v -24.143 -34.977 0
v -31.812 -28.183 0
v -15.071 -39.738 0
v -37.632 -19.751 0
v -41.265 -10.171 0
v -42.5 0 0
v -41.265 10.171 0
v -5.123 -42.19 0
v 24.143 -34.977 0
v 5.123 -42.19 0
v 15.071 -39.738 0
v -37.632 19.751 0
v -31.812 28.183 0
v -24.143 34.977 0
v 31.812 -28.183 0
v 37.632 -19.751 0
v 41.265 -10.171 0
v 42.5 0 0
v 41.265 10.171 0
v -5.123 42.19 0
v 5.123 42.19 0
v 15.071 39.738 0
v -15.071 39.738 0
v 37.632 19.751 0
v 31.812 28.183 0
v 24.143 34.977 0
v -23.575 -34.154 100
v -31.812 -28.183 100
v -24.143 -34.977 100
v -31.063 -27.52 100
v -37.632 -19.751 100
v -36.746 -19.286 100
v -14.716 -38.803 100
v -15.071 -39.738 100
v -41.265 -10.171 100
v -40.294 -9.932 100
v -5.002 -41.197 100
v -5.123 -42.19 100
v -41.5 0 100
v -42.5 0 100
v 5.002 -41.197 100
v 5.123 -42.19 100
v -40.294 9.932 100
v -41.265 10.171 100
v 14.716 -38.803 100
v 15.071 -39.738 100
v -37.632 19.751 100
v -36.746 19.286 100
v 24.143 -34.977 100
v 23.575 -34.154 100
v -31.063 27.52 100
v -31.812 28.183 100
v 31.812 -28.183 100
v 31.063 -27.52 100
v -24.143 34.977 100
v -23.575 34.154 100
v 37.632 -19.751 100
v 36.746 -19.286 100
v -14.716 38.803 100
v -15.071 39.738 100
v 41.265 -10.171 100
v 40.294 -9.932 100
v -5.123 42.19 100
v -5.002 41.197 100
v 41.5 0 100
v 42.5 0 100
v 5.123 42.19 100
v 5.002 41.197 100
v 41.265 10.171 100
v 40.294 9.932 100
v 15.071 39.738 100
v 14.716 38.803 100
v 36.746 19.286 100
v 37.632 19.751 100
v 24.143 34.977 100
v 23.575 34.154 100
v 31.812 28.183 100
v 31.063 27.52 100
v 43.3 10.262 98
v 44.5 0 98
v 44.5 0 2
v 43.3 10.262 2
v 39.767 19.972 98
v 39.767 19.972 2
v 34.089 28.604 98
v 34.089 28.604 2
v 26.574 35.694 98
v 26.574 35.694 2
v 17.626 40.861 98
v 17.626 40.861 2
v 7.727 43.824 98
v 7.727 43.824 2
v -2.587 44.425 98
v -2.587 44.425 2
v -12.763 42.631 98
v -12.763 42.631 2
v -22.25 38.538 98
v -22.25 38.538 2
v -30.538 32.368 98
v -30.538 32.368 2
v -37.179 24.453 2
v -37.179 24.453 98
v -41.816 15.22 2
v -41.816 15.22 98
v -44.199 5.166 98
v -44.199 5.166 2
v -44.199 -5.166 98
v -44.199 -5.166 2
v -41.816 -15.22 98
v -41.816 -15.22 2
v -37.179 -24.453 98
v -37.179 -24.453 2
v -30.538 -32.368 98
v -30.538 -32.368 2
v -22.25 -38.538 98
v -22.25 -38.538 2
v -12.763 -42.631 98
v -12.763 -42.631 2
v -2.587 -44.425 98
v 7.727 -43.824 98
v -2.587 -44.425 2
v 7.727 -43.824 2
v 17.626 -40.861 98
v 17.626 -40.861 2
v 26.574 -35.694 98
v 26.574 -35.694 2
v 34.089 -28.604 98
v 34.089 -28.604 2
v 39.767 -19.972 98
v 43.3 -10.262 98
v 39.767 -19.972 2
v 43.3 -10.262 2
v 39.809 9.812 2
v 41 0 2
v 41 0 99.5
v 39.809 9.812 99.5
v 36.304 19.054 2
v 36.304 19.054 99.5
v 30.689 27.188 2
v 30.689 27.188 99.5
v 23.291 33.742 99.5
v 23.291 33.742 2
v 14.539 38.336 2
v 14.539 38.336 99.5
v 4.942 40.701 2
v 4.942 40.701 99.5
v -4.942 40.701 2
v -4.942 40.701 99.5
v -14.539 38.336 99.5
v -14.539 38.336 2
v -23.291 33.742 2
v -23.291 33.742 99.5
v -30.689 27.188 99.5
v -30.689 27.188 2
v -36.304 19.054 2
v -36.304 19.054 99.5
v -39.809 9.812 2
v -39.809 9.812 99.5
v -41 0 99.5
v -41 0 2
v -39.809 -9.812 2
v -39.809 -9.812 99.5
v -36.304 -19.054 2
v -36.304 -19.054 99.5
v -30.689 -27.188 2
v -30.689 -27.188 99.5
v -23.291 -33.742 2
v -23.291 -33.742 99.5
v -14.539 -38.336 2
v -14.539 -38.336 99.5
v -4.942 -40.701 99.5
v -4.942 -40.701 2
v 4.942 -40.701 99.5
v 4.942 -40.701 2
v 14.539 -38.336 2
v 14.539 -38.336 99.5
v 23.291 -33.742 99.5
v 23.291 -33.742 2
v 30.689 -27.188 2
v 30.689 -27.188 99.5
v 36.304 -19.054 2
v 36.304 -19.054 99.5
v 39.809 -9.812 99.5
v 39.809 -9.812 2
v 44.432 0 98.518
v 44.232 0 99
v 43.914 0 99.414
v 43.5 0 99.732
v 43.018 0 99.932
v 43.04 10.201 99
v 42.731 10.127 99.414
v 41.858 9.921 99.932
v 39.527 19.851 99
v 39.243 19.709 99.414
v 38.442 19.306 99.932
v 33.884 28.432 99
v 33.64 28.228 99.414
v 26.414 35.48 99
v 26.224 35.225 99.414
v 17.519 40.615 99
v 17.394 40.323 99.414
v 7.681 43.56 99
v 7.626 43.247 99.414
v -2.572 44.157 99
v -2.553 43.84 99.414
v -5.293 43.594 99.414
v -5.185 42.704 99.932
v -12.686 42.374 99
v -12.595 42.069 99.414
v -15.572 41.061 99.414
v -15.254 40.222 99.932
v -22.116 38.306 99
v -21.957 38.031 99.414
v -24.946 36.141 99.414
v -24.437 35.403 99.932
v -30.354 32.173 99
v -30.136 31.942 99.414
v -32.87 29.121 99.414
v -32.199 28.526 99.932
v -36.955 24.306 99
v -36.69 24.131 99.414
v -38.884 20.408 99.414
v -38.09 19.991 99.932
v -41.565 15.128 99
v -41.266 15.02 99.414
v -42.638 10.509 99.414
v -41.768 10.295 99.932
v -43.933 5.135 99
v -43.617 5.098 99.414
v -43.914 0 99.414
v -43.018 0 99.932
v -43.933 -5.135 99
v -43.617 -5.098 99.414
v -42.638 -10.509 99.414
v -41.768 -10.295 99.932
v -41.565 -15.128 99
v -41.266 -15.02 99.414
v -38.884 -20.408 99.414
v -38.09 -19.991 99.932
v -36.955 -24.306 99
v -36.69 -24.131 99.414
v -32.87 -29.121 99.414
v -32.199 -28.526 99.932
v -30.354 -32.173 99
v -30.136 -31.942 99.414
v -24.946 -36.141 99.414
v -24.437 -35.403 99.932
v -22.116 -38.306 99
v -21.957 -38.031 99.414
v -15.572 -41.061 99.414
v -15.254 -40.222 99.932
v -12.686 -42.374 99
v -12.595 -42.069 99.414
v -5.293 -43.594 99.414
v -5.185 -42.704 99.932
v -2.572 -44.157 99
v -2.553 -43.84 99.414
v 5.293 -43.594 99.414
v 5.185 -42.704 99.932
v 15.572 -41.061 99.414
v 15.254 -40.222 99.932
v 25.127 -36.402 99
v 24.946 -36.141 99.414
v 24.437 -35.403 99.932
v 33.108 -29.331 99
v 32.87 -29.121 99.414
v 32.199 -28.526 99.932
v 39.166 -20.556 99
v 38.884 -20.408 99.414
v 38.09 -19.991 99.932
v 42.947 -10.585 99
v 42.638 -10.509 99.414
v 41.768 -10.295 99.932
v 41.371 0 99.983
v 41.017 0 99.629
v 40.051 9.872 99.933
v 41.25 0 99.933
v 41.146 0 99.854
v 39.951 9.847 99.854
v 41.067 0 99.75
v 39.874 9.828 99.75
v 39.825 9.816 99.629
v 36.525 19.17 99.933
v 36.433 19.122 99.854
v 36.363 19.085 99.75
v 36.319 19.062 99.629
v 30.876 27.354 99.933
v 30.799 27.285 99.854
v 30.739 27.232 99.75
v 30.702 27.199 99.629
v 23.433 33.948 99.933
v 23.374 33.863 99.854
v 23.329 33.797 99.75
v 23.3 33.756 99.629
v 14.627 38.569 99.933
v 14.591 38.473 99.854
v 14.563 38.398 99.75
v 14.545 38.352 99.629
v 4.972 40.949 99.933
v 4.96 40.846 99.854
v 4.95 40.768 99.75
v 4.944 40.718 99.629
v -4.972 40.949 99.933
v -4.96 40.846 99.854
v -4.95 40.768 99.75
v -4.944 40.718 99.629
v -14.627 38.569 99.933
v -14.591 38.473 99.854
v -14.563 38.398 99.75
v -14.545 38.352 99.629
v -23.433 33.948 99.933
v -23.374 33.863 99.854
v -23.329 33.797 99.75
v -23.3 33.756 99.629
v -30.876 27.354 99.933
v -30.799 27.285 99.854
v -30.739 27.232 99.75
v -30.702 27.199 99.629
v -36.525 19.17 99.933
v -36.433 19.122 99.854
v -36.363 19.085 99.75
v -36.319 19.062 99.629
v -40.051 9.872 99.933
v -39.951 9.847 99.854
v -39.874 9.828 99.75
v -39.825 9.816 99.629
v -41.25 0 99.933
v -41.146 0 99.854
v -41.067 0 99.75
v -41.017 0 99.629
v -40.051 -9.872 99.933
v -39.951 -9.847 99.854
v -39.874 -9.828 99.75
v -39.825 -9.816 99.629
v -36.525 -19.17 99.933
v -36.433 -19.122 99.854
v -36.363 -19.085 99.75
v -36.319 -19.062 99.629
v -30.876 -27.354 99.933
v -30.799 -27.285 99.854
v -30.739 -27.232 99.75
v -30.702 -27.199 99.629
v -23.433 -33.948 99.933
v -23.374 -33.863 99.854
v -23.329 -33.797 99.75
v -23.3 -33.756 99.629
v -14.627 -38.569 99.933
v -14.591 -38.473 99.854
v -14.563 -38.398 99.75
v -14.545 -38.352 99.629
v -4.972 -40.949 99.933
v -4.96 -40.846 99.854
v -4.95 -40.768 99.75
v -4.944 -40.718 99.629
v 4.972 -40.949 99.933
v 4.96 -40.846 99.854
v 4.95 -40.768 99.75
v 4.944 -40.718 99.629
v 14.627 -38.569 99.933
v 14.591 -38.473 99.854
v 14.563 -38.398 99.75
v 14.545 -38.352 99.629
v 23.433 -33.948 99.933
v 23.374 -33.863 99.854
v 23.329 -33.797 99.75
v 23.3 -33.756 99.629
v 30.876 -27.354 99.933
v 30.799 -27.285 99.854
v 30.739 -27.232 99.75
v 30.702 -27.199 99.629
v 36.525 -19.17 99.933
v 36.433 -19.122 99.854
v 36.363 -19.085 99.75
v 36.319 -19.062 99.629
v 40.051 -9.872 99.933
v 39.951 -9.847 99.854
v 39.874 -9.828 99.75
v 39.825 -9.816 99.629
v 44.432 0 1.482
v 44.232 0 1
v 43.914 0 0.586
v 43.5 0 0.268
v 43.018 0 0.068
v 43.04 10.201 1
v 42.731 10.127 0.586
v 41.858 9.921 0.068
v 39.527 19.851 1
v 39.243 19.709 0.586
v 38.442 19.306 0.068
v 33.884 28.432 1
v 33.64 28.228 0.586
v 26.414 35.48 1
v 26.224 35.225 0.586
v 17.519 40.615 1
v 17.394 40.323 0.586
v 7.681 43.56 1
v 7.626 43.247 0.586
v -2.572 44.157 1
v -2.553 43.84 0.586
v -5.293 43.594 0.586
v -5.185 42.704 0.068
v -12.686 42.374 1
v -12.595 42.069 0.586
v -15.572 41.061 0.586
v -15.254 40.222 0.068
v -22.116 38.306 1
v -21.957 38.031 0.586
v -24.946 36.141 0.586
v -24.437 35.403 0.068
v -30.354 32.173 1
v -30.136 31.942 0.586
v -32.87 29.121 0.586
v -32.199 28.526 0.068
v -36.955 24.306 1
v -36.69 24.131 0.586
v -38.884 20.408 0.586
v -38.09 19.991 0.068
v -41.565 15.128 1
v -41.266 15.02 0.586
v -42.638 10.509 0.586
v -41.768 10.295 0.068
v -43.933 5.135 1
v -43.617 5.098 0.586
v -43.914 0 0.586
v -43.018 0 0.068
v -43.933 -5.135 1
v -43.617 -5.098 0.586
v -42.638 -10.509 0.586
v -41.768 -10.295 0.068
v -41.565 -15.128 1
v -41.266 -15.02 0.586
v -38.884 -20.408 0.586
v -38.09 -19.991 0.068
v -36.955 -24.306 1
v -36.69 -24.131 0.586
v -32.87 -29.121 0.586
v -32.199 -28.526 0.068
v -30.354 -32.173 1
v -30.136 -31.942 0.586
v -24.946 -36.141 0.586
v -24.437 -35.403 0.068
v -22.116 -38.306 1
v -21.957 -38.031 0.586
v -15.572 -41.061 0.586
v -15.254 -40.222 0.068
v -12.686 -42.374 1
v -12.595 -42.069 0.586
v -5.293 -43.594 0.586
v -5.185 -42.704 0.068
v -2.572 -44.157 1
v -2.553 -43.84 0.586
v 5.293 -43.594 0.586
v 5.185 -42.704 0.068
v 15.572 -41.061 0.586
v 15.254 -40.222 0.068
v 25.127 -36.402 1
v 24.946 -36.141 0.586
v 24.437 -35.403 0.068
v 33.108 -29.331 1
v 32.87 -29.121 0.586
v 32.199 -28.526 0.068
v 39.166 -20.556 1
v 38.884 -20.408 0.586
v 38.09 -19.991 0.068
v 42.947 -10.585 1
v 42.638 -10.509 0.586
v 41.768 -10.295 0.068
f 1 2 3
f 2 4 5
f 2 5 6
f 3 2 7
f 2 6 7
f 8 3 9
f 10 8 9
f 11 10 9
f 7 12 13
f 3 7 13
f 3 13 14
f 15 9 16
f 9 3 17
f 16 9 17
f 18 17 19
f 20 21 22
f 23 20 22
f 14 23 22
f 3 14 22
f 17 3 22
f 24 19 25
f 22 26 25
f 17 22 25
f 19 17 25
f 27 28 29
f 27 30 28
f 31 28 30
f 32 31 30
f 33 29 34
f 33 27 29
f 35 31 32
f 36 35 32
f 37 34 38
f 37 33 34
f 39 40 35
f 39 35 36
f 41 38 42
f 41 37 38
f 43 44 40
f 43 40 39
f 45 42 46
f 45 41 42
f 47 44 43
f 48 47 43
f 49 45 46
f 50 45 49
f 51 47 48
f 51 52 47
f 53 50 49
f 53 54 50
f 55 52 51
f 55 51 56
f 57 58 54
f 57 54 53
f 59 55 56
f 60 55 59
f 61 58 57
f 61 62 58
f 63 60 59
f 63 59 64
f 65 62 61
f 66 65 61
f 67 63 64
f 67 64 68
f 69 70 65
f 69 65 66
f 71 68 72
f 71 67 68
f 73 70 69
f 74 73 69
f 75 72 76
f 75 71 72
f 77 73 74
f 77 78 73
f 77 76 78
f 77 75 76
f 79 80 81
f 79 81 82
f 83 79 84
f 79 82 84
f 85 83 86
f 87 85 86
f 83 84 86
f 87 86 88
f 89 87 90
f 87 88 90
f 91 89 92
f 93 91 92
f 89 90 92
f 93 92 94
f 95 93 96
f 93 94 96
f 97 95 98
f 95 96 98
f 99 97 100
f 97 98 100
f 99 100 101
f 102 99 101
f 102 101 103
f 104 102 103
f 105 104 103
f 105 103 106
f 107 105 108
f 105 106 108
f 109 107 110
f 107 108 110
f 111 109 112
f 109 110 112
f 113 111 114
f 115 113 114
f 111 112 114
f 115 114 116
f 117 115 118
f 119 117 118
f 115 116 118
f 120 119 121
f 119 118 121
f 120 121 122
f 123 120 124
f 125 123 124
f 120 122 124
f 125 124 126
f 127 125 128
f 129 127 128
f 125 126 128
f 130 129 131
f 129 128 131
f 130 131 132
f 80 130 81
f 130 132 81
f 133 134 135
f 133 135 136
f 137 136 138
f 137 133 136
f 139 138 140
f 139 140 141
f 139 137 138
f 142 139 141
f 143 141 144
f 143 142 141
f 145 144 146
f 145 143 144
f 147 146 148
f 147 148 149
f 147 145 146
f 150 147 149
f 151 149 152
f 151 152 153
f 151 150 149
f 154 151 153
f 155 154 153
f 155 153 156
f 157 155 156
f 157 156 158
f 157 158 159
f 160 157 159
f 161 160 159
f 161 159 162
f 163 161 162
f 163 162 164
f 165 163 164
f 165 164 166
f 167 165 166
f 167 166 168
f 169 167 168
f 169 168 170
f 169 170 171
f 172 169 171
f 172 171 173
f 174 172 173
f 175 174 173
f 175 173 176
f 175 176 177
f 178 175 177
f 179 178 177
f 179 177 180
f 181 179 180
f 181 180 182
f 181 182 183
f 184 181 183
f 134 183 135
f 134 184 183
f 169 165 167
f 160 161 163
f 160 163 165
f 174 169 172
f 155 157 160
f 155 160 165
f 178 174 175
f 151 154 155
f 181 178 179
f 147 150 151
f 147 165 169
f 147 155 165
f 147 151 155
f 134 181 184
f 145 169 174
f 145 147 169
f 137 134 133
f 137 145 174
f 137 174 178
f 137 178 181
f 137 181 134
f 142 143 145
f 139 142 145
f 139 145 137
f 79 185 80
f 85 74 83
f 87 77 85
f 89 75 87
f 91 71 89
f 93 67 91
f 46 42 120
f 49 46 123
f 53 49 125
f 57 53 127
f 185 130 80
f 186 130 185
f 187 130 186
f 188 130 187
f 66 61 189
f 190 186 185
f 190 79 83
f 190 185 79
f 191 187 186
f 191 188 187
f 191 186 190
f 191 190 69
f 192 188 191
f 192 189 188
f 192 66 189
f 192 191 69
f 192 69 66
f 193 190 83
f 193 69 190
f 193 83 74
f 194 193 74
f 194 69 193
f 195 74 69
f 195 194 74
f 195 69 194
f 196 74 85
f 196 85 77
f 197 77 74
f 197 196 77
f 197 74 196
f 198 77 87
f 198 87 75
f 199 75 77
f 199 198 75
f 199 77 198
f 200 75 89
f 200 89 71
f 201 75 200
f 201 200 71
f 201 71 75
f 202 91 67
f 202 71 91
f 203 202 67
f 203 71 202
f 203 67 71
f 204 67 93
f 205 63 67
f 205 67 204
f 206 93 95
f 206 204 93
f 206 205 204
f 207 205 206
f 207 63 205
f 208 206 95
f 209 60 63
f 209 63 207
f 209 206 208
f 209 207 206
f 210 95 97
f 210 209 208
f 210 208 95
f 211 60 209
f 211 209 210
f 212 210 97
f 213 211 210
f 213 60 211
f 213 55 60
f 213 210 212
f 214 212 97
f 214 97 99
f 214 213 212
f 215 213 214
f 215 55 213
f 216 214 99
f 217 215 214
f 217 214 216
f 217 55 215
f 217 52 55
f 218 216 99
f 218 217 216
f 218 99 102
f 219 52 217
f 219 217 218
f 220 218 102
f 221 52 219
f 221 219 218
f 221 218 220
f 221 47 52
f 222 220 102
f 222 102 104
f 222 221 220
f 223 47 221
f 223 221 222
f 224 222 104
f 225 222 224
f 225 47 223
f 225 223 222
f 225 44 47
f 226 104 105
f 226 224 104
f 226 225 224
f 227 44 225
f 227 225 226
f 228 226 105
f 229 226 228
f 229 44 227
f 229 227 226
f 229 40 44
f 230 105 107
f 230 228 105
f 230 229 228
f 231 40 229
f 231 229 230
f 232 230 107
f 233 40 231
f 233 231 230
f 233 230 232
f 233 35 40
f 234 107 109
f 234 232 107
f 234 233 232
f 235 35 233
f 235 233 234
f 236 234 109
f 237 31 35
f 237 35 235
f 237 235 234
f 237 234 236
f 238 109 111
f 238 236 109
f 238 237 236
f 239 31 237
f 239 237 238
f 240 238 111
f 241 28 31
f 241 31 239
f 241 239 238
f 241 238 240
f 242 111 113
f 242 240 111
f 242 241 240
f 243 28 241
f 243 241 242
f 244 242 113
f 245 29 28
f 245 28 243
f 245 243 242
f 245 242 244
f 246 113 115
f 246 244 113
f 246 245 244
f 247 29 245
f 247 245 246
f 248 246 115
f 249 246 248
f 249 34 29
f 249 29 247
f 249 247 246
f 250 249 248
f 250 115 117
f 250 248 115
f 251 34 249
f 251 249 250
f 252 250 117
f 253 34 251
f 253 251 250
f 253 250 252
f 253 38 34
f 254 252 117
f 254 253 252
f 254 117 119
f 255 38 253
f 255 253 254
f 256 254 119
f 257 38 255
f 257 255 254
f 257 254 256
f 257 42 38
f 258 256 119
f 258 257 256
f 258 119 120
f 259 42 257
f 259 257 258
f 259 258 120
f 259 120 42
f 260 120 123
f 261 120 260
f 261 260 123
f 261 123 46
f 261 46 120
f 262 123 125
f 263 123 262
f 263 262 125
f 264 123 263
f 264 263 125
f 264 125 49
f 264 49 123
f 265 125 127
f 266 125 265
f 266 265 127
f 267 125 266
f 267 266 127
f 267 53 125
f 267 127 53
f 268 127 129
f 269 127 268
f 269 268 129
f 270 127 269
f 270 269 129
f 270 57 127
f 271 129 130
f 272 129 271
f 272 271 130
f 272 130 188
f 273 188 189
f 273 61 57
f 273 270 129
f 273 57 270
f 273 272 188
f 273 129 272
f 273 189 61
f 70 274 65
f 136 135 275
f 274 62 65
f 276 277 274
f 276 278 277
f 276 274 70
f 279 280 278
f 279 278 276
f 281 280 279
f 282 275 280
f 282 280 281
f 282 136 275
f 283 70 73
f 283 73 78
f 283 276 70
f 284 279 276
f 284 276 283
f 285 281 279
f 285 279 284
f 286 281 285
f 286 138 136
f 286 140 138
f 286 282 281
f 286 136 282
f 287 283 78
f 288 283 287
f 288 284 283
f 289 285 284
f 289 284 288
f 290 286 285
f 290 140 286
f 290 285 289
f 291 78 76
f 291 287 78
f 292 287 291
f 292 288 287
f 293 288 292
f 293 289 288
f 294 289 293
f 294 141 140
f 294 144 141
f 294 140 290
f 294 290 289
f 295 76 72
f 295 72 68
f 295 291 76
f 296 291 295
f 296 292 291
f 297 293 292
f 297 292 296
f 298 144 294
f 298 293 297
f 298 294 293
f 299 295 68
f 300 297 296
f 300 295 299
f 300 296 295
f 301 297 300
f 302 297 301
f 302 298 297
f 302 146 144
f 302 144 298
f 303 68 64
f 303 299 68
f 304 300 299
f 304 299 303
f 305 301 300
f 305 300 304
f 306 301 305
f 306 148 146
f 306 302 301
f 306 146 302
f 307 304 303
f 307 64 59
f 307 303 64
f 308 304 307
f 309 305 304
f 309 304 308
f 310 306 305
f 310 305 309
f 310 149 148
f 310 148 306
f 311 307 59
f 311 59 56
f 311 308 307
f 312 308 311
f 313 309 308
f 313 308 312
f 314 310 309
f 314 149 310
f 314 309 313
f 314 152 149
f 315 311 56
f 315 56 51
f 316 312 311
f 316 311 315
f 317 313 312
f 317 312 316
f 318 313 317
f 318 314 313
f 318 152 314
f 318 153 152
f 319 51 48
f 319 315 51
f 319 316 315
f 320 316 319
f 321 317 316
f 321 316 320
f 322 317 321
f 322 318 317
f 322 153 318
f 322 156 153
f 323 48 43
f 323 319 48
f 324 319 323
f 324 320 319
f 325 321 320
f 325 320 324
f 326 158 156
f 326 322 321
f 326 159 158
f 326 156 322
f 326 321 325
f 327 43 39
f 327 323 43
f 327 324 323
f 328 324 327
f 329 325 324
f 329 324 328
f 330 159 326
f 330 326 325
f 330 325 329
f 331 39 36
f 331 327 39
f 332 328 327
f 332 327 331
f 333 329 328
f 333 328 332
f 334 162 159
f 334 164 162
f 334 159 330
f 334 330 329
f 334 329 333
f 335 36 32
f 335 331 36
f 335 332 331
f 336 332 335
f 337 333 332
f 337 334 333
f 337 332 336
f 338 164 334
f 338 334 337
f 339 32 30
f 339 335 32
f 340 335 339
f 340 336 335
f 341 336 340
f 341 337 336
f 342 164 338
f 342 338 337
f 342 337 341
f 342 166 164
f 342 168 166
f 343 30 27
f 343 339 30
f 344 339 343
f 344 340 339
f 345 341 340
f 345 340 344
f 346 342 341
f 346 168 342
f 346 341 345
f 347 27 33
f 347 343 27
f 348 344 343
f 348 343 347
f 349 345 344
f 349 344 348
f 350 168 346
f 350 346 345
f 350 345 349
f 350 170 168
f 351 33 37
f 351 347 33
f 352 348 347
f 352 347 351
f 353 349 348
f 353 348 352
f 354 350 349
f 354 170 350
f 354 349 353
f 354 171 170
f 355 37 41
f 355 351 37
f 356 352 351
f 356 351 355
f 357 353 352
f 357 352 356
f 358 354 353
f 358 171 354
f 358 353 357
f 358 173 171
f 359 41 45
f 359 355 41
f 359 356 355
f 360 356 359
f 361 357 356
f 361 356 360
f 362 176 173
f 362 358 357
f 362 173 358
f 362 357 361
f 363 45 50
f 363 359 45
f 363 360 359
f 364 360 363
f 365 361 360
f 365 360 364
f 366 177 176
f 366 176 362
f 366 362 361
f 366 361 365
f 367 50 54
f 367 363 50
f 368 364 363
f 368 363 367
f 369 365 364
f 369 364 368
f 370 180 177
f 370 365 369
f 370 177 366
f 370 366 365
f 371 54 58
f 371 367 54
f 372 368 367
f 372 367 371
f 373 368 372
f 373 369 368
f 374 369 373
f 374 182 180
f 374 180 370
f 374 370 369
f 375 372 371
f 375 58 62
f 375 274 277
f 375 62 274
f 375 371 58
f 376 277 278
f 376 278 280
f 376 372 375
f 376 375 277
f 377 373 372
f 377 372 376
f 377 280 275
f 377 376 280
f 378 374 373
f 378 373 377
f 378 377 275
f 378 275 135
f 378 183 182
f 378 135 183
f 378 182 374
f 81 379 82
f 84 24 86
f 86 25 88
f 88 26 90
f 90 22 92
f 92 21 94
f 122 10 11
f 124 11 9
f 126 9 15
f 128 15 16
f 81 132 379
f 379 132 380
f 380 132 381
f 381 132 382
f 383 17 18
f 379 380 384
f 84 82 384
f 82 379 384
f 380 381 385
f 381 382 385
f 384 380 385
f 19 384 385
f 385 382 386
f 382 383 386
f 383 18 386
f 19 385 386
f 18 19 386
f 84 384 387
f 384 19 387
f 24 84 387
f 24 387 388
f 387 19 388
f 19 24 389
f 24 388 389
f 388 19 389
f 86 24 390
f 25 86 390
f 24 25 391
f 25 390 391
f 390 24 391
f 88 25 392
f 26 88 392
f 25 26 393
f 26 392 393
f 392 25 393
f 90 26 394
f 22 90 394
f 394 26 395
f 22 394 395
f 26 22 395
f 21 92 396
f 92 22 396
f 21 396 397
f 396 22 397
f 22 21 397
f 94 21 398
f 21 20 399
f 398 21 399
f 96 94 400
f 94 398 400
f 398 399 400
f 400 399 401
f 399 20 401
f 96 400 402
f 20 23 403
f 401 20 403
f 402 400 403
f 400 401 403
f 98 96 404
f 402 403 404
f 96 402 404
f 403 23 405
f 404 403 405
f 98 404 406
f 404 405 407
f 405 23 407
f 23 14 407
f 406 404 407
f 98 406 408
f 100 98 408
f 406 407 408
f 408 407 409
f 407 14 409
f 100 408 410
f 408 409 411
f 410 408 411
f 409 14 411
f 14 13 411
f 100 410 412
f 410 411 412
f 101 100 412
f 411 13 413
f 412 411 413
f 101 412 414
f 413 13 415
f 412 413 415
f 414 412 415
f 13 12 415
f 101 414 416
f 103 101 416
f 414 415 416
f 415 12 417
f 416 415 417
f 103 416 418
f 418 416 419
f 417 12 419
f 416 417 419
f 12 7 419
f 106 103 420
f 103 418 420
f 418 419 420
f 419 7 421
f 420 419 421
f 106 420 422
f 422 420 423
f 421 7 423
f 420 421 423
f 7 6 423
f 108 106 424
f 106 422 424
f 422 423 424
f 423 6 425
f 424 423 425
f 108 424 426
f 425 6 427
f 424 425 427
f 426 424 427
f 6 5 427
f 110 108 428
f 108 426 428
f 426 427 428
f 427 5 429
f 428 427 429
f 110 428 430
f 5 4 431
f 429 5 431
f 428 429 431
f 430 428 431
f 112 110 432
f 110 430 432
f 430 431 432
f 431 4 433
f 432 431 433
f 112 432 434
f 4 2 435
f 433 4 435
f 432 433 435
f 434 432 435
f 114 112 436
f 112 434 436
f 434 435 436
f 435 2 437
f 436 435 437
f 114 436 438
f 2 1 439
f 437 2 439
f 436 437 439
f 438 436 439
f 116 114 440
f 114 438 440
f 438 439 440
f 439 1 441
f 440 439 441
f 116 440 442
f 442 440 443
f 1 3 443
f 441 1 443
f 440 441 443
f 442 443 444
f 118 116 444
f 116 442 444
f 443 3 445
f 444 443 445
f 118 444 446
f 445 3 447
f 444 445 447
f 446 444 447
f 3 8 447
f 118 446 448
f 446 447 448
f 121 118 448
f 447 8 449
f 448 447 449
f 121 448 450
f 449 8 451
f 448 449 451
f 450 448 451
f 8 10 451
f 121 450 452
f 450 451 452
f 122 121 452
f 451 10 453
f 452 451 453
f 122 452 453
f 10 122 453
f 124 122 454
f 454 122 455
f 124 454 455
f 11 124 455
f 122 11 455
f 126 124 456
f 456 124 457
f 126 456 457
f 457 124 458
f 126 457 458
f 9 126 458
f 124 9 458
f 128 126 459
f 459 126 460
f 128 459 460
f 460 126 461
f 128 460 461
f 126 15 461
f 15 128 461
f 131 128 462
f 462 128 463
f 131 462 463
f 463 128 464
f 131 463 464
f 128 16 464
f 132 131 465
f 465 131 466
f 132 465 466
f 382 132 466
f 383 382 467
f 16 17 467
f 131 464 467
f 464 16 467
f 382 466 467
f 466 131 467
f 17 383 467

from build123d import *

# Parameters (mm, degrees)
F0_R     = 44.5
F0_R_2   = 41
F1_DEPTH = 100
F2_R     = 2
F3_R     = 0.5
F4_DEPTH = 2


with BuildPart() as f1:
    # F0 (on Top) → F1 (new body)
    with BuildSketch(Plane.XY):
        Circle(F0_R)
        Circle(F0_R_2, mode=Mode.SUBTRACT)
    extrude(amount=F1_DEPTH)

    # F2
    f2_edges = [f1.edges().sort_by_distance(p)[0] for p in [
        (-44.5, 0, 100),
        (-44.5, 0, 0),
    ]]
    fillet(f2_edges, radius=F2_R)

    # F3
    f3_edges = [f1.edges().sort_by_distance(p)[0] for p in [
        (-41, 0, 100),
    ]]
    fillet(f3_edges, radius=F3_R)

    # F0 (on Top) → F4 (join)
    with BuildSketch(Plane.XY):
        Circle(F0_R_2)
    extrude(amount=F4_DEPTH)


solid = f1.part
